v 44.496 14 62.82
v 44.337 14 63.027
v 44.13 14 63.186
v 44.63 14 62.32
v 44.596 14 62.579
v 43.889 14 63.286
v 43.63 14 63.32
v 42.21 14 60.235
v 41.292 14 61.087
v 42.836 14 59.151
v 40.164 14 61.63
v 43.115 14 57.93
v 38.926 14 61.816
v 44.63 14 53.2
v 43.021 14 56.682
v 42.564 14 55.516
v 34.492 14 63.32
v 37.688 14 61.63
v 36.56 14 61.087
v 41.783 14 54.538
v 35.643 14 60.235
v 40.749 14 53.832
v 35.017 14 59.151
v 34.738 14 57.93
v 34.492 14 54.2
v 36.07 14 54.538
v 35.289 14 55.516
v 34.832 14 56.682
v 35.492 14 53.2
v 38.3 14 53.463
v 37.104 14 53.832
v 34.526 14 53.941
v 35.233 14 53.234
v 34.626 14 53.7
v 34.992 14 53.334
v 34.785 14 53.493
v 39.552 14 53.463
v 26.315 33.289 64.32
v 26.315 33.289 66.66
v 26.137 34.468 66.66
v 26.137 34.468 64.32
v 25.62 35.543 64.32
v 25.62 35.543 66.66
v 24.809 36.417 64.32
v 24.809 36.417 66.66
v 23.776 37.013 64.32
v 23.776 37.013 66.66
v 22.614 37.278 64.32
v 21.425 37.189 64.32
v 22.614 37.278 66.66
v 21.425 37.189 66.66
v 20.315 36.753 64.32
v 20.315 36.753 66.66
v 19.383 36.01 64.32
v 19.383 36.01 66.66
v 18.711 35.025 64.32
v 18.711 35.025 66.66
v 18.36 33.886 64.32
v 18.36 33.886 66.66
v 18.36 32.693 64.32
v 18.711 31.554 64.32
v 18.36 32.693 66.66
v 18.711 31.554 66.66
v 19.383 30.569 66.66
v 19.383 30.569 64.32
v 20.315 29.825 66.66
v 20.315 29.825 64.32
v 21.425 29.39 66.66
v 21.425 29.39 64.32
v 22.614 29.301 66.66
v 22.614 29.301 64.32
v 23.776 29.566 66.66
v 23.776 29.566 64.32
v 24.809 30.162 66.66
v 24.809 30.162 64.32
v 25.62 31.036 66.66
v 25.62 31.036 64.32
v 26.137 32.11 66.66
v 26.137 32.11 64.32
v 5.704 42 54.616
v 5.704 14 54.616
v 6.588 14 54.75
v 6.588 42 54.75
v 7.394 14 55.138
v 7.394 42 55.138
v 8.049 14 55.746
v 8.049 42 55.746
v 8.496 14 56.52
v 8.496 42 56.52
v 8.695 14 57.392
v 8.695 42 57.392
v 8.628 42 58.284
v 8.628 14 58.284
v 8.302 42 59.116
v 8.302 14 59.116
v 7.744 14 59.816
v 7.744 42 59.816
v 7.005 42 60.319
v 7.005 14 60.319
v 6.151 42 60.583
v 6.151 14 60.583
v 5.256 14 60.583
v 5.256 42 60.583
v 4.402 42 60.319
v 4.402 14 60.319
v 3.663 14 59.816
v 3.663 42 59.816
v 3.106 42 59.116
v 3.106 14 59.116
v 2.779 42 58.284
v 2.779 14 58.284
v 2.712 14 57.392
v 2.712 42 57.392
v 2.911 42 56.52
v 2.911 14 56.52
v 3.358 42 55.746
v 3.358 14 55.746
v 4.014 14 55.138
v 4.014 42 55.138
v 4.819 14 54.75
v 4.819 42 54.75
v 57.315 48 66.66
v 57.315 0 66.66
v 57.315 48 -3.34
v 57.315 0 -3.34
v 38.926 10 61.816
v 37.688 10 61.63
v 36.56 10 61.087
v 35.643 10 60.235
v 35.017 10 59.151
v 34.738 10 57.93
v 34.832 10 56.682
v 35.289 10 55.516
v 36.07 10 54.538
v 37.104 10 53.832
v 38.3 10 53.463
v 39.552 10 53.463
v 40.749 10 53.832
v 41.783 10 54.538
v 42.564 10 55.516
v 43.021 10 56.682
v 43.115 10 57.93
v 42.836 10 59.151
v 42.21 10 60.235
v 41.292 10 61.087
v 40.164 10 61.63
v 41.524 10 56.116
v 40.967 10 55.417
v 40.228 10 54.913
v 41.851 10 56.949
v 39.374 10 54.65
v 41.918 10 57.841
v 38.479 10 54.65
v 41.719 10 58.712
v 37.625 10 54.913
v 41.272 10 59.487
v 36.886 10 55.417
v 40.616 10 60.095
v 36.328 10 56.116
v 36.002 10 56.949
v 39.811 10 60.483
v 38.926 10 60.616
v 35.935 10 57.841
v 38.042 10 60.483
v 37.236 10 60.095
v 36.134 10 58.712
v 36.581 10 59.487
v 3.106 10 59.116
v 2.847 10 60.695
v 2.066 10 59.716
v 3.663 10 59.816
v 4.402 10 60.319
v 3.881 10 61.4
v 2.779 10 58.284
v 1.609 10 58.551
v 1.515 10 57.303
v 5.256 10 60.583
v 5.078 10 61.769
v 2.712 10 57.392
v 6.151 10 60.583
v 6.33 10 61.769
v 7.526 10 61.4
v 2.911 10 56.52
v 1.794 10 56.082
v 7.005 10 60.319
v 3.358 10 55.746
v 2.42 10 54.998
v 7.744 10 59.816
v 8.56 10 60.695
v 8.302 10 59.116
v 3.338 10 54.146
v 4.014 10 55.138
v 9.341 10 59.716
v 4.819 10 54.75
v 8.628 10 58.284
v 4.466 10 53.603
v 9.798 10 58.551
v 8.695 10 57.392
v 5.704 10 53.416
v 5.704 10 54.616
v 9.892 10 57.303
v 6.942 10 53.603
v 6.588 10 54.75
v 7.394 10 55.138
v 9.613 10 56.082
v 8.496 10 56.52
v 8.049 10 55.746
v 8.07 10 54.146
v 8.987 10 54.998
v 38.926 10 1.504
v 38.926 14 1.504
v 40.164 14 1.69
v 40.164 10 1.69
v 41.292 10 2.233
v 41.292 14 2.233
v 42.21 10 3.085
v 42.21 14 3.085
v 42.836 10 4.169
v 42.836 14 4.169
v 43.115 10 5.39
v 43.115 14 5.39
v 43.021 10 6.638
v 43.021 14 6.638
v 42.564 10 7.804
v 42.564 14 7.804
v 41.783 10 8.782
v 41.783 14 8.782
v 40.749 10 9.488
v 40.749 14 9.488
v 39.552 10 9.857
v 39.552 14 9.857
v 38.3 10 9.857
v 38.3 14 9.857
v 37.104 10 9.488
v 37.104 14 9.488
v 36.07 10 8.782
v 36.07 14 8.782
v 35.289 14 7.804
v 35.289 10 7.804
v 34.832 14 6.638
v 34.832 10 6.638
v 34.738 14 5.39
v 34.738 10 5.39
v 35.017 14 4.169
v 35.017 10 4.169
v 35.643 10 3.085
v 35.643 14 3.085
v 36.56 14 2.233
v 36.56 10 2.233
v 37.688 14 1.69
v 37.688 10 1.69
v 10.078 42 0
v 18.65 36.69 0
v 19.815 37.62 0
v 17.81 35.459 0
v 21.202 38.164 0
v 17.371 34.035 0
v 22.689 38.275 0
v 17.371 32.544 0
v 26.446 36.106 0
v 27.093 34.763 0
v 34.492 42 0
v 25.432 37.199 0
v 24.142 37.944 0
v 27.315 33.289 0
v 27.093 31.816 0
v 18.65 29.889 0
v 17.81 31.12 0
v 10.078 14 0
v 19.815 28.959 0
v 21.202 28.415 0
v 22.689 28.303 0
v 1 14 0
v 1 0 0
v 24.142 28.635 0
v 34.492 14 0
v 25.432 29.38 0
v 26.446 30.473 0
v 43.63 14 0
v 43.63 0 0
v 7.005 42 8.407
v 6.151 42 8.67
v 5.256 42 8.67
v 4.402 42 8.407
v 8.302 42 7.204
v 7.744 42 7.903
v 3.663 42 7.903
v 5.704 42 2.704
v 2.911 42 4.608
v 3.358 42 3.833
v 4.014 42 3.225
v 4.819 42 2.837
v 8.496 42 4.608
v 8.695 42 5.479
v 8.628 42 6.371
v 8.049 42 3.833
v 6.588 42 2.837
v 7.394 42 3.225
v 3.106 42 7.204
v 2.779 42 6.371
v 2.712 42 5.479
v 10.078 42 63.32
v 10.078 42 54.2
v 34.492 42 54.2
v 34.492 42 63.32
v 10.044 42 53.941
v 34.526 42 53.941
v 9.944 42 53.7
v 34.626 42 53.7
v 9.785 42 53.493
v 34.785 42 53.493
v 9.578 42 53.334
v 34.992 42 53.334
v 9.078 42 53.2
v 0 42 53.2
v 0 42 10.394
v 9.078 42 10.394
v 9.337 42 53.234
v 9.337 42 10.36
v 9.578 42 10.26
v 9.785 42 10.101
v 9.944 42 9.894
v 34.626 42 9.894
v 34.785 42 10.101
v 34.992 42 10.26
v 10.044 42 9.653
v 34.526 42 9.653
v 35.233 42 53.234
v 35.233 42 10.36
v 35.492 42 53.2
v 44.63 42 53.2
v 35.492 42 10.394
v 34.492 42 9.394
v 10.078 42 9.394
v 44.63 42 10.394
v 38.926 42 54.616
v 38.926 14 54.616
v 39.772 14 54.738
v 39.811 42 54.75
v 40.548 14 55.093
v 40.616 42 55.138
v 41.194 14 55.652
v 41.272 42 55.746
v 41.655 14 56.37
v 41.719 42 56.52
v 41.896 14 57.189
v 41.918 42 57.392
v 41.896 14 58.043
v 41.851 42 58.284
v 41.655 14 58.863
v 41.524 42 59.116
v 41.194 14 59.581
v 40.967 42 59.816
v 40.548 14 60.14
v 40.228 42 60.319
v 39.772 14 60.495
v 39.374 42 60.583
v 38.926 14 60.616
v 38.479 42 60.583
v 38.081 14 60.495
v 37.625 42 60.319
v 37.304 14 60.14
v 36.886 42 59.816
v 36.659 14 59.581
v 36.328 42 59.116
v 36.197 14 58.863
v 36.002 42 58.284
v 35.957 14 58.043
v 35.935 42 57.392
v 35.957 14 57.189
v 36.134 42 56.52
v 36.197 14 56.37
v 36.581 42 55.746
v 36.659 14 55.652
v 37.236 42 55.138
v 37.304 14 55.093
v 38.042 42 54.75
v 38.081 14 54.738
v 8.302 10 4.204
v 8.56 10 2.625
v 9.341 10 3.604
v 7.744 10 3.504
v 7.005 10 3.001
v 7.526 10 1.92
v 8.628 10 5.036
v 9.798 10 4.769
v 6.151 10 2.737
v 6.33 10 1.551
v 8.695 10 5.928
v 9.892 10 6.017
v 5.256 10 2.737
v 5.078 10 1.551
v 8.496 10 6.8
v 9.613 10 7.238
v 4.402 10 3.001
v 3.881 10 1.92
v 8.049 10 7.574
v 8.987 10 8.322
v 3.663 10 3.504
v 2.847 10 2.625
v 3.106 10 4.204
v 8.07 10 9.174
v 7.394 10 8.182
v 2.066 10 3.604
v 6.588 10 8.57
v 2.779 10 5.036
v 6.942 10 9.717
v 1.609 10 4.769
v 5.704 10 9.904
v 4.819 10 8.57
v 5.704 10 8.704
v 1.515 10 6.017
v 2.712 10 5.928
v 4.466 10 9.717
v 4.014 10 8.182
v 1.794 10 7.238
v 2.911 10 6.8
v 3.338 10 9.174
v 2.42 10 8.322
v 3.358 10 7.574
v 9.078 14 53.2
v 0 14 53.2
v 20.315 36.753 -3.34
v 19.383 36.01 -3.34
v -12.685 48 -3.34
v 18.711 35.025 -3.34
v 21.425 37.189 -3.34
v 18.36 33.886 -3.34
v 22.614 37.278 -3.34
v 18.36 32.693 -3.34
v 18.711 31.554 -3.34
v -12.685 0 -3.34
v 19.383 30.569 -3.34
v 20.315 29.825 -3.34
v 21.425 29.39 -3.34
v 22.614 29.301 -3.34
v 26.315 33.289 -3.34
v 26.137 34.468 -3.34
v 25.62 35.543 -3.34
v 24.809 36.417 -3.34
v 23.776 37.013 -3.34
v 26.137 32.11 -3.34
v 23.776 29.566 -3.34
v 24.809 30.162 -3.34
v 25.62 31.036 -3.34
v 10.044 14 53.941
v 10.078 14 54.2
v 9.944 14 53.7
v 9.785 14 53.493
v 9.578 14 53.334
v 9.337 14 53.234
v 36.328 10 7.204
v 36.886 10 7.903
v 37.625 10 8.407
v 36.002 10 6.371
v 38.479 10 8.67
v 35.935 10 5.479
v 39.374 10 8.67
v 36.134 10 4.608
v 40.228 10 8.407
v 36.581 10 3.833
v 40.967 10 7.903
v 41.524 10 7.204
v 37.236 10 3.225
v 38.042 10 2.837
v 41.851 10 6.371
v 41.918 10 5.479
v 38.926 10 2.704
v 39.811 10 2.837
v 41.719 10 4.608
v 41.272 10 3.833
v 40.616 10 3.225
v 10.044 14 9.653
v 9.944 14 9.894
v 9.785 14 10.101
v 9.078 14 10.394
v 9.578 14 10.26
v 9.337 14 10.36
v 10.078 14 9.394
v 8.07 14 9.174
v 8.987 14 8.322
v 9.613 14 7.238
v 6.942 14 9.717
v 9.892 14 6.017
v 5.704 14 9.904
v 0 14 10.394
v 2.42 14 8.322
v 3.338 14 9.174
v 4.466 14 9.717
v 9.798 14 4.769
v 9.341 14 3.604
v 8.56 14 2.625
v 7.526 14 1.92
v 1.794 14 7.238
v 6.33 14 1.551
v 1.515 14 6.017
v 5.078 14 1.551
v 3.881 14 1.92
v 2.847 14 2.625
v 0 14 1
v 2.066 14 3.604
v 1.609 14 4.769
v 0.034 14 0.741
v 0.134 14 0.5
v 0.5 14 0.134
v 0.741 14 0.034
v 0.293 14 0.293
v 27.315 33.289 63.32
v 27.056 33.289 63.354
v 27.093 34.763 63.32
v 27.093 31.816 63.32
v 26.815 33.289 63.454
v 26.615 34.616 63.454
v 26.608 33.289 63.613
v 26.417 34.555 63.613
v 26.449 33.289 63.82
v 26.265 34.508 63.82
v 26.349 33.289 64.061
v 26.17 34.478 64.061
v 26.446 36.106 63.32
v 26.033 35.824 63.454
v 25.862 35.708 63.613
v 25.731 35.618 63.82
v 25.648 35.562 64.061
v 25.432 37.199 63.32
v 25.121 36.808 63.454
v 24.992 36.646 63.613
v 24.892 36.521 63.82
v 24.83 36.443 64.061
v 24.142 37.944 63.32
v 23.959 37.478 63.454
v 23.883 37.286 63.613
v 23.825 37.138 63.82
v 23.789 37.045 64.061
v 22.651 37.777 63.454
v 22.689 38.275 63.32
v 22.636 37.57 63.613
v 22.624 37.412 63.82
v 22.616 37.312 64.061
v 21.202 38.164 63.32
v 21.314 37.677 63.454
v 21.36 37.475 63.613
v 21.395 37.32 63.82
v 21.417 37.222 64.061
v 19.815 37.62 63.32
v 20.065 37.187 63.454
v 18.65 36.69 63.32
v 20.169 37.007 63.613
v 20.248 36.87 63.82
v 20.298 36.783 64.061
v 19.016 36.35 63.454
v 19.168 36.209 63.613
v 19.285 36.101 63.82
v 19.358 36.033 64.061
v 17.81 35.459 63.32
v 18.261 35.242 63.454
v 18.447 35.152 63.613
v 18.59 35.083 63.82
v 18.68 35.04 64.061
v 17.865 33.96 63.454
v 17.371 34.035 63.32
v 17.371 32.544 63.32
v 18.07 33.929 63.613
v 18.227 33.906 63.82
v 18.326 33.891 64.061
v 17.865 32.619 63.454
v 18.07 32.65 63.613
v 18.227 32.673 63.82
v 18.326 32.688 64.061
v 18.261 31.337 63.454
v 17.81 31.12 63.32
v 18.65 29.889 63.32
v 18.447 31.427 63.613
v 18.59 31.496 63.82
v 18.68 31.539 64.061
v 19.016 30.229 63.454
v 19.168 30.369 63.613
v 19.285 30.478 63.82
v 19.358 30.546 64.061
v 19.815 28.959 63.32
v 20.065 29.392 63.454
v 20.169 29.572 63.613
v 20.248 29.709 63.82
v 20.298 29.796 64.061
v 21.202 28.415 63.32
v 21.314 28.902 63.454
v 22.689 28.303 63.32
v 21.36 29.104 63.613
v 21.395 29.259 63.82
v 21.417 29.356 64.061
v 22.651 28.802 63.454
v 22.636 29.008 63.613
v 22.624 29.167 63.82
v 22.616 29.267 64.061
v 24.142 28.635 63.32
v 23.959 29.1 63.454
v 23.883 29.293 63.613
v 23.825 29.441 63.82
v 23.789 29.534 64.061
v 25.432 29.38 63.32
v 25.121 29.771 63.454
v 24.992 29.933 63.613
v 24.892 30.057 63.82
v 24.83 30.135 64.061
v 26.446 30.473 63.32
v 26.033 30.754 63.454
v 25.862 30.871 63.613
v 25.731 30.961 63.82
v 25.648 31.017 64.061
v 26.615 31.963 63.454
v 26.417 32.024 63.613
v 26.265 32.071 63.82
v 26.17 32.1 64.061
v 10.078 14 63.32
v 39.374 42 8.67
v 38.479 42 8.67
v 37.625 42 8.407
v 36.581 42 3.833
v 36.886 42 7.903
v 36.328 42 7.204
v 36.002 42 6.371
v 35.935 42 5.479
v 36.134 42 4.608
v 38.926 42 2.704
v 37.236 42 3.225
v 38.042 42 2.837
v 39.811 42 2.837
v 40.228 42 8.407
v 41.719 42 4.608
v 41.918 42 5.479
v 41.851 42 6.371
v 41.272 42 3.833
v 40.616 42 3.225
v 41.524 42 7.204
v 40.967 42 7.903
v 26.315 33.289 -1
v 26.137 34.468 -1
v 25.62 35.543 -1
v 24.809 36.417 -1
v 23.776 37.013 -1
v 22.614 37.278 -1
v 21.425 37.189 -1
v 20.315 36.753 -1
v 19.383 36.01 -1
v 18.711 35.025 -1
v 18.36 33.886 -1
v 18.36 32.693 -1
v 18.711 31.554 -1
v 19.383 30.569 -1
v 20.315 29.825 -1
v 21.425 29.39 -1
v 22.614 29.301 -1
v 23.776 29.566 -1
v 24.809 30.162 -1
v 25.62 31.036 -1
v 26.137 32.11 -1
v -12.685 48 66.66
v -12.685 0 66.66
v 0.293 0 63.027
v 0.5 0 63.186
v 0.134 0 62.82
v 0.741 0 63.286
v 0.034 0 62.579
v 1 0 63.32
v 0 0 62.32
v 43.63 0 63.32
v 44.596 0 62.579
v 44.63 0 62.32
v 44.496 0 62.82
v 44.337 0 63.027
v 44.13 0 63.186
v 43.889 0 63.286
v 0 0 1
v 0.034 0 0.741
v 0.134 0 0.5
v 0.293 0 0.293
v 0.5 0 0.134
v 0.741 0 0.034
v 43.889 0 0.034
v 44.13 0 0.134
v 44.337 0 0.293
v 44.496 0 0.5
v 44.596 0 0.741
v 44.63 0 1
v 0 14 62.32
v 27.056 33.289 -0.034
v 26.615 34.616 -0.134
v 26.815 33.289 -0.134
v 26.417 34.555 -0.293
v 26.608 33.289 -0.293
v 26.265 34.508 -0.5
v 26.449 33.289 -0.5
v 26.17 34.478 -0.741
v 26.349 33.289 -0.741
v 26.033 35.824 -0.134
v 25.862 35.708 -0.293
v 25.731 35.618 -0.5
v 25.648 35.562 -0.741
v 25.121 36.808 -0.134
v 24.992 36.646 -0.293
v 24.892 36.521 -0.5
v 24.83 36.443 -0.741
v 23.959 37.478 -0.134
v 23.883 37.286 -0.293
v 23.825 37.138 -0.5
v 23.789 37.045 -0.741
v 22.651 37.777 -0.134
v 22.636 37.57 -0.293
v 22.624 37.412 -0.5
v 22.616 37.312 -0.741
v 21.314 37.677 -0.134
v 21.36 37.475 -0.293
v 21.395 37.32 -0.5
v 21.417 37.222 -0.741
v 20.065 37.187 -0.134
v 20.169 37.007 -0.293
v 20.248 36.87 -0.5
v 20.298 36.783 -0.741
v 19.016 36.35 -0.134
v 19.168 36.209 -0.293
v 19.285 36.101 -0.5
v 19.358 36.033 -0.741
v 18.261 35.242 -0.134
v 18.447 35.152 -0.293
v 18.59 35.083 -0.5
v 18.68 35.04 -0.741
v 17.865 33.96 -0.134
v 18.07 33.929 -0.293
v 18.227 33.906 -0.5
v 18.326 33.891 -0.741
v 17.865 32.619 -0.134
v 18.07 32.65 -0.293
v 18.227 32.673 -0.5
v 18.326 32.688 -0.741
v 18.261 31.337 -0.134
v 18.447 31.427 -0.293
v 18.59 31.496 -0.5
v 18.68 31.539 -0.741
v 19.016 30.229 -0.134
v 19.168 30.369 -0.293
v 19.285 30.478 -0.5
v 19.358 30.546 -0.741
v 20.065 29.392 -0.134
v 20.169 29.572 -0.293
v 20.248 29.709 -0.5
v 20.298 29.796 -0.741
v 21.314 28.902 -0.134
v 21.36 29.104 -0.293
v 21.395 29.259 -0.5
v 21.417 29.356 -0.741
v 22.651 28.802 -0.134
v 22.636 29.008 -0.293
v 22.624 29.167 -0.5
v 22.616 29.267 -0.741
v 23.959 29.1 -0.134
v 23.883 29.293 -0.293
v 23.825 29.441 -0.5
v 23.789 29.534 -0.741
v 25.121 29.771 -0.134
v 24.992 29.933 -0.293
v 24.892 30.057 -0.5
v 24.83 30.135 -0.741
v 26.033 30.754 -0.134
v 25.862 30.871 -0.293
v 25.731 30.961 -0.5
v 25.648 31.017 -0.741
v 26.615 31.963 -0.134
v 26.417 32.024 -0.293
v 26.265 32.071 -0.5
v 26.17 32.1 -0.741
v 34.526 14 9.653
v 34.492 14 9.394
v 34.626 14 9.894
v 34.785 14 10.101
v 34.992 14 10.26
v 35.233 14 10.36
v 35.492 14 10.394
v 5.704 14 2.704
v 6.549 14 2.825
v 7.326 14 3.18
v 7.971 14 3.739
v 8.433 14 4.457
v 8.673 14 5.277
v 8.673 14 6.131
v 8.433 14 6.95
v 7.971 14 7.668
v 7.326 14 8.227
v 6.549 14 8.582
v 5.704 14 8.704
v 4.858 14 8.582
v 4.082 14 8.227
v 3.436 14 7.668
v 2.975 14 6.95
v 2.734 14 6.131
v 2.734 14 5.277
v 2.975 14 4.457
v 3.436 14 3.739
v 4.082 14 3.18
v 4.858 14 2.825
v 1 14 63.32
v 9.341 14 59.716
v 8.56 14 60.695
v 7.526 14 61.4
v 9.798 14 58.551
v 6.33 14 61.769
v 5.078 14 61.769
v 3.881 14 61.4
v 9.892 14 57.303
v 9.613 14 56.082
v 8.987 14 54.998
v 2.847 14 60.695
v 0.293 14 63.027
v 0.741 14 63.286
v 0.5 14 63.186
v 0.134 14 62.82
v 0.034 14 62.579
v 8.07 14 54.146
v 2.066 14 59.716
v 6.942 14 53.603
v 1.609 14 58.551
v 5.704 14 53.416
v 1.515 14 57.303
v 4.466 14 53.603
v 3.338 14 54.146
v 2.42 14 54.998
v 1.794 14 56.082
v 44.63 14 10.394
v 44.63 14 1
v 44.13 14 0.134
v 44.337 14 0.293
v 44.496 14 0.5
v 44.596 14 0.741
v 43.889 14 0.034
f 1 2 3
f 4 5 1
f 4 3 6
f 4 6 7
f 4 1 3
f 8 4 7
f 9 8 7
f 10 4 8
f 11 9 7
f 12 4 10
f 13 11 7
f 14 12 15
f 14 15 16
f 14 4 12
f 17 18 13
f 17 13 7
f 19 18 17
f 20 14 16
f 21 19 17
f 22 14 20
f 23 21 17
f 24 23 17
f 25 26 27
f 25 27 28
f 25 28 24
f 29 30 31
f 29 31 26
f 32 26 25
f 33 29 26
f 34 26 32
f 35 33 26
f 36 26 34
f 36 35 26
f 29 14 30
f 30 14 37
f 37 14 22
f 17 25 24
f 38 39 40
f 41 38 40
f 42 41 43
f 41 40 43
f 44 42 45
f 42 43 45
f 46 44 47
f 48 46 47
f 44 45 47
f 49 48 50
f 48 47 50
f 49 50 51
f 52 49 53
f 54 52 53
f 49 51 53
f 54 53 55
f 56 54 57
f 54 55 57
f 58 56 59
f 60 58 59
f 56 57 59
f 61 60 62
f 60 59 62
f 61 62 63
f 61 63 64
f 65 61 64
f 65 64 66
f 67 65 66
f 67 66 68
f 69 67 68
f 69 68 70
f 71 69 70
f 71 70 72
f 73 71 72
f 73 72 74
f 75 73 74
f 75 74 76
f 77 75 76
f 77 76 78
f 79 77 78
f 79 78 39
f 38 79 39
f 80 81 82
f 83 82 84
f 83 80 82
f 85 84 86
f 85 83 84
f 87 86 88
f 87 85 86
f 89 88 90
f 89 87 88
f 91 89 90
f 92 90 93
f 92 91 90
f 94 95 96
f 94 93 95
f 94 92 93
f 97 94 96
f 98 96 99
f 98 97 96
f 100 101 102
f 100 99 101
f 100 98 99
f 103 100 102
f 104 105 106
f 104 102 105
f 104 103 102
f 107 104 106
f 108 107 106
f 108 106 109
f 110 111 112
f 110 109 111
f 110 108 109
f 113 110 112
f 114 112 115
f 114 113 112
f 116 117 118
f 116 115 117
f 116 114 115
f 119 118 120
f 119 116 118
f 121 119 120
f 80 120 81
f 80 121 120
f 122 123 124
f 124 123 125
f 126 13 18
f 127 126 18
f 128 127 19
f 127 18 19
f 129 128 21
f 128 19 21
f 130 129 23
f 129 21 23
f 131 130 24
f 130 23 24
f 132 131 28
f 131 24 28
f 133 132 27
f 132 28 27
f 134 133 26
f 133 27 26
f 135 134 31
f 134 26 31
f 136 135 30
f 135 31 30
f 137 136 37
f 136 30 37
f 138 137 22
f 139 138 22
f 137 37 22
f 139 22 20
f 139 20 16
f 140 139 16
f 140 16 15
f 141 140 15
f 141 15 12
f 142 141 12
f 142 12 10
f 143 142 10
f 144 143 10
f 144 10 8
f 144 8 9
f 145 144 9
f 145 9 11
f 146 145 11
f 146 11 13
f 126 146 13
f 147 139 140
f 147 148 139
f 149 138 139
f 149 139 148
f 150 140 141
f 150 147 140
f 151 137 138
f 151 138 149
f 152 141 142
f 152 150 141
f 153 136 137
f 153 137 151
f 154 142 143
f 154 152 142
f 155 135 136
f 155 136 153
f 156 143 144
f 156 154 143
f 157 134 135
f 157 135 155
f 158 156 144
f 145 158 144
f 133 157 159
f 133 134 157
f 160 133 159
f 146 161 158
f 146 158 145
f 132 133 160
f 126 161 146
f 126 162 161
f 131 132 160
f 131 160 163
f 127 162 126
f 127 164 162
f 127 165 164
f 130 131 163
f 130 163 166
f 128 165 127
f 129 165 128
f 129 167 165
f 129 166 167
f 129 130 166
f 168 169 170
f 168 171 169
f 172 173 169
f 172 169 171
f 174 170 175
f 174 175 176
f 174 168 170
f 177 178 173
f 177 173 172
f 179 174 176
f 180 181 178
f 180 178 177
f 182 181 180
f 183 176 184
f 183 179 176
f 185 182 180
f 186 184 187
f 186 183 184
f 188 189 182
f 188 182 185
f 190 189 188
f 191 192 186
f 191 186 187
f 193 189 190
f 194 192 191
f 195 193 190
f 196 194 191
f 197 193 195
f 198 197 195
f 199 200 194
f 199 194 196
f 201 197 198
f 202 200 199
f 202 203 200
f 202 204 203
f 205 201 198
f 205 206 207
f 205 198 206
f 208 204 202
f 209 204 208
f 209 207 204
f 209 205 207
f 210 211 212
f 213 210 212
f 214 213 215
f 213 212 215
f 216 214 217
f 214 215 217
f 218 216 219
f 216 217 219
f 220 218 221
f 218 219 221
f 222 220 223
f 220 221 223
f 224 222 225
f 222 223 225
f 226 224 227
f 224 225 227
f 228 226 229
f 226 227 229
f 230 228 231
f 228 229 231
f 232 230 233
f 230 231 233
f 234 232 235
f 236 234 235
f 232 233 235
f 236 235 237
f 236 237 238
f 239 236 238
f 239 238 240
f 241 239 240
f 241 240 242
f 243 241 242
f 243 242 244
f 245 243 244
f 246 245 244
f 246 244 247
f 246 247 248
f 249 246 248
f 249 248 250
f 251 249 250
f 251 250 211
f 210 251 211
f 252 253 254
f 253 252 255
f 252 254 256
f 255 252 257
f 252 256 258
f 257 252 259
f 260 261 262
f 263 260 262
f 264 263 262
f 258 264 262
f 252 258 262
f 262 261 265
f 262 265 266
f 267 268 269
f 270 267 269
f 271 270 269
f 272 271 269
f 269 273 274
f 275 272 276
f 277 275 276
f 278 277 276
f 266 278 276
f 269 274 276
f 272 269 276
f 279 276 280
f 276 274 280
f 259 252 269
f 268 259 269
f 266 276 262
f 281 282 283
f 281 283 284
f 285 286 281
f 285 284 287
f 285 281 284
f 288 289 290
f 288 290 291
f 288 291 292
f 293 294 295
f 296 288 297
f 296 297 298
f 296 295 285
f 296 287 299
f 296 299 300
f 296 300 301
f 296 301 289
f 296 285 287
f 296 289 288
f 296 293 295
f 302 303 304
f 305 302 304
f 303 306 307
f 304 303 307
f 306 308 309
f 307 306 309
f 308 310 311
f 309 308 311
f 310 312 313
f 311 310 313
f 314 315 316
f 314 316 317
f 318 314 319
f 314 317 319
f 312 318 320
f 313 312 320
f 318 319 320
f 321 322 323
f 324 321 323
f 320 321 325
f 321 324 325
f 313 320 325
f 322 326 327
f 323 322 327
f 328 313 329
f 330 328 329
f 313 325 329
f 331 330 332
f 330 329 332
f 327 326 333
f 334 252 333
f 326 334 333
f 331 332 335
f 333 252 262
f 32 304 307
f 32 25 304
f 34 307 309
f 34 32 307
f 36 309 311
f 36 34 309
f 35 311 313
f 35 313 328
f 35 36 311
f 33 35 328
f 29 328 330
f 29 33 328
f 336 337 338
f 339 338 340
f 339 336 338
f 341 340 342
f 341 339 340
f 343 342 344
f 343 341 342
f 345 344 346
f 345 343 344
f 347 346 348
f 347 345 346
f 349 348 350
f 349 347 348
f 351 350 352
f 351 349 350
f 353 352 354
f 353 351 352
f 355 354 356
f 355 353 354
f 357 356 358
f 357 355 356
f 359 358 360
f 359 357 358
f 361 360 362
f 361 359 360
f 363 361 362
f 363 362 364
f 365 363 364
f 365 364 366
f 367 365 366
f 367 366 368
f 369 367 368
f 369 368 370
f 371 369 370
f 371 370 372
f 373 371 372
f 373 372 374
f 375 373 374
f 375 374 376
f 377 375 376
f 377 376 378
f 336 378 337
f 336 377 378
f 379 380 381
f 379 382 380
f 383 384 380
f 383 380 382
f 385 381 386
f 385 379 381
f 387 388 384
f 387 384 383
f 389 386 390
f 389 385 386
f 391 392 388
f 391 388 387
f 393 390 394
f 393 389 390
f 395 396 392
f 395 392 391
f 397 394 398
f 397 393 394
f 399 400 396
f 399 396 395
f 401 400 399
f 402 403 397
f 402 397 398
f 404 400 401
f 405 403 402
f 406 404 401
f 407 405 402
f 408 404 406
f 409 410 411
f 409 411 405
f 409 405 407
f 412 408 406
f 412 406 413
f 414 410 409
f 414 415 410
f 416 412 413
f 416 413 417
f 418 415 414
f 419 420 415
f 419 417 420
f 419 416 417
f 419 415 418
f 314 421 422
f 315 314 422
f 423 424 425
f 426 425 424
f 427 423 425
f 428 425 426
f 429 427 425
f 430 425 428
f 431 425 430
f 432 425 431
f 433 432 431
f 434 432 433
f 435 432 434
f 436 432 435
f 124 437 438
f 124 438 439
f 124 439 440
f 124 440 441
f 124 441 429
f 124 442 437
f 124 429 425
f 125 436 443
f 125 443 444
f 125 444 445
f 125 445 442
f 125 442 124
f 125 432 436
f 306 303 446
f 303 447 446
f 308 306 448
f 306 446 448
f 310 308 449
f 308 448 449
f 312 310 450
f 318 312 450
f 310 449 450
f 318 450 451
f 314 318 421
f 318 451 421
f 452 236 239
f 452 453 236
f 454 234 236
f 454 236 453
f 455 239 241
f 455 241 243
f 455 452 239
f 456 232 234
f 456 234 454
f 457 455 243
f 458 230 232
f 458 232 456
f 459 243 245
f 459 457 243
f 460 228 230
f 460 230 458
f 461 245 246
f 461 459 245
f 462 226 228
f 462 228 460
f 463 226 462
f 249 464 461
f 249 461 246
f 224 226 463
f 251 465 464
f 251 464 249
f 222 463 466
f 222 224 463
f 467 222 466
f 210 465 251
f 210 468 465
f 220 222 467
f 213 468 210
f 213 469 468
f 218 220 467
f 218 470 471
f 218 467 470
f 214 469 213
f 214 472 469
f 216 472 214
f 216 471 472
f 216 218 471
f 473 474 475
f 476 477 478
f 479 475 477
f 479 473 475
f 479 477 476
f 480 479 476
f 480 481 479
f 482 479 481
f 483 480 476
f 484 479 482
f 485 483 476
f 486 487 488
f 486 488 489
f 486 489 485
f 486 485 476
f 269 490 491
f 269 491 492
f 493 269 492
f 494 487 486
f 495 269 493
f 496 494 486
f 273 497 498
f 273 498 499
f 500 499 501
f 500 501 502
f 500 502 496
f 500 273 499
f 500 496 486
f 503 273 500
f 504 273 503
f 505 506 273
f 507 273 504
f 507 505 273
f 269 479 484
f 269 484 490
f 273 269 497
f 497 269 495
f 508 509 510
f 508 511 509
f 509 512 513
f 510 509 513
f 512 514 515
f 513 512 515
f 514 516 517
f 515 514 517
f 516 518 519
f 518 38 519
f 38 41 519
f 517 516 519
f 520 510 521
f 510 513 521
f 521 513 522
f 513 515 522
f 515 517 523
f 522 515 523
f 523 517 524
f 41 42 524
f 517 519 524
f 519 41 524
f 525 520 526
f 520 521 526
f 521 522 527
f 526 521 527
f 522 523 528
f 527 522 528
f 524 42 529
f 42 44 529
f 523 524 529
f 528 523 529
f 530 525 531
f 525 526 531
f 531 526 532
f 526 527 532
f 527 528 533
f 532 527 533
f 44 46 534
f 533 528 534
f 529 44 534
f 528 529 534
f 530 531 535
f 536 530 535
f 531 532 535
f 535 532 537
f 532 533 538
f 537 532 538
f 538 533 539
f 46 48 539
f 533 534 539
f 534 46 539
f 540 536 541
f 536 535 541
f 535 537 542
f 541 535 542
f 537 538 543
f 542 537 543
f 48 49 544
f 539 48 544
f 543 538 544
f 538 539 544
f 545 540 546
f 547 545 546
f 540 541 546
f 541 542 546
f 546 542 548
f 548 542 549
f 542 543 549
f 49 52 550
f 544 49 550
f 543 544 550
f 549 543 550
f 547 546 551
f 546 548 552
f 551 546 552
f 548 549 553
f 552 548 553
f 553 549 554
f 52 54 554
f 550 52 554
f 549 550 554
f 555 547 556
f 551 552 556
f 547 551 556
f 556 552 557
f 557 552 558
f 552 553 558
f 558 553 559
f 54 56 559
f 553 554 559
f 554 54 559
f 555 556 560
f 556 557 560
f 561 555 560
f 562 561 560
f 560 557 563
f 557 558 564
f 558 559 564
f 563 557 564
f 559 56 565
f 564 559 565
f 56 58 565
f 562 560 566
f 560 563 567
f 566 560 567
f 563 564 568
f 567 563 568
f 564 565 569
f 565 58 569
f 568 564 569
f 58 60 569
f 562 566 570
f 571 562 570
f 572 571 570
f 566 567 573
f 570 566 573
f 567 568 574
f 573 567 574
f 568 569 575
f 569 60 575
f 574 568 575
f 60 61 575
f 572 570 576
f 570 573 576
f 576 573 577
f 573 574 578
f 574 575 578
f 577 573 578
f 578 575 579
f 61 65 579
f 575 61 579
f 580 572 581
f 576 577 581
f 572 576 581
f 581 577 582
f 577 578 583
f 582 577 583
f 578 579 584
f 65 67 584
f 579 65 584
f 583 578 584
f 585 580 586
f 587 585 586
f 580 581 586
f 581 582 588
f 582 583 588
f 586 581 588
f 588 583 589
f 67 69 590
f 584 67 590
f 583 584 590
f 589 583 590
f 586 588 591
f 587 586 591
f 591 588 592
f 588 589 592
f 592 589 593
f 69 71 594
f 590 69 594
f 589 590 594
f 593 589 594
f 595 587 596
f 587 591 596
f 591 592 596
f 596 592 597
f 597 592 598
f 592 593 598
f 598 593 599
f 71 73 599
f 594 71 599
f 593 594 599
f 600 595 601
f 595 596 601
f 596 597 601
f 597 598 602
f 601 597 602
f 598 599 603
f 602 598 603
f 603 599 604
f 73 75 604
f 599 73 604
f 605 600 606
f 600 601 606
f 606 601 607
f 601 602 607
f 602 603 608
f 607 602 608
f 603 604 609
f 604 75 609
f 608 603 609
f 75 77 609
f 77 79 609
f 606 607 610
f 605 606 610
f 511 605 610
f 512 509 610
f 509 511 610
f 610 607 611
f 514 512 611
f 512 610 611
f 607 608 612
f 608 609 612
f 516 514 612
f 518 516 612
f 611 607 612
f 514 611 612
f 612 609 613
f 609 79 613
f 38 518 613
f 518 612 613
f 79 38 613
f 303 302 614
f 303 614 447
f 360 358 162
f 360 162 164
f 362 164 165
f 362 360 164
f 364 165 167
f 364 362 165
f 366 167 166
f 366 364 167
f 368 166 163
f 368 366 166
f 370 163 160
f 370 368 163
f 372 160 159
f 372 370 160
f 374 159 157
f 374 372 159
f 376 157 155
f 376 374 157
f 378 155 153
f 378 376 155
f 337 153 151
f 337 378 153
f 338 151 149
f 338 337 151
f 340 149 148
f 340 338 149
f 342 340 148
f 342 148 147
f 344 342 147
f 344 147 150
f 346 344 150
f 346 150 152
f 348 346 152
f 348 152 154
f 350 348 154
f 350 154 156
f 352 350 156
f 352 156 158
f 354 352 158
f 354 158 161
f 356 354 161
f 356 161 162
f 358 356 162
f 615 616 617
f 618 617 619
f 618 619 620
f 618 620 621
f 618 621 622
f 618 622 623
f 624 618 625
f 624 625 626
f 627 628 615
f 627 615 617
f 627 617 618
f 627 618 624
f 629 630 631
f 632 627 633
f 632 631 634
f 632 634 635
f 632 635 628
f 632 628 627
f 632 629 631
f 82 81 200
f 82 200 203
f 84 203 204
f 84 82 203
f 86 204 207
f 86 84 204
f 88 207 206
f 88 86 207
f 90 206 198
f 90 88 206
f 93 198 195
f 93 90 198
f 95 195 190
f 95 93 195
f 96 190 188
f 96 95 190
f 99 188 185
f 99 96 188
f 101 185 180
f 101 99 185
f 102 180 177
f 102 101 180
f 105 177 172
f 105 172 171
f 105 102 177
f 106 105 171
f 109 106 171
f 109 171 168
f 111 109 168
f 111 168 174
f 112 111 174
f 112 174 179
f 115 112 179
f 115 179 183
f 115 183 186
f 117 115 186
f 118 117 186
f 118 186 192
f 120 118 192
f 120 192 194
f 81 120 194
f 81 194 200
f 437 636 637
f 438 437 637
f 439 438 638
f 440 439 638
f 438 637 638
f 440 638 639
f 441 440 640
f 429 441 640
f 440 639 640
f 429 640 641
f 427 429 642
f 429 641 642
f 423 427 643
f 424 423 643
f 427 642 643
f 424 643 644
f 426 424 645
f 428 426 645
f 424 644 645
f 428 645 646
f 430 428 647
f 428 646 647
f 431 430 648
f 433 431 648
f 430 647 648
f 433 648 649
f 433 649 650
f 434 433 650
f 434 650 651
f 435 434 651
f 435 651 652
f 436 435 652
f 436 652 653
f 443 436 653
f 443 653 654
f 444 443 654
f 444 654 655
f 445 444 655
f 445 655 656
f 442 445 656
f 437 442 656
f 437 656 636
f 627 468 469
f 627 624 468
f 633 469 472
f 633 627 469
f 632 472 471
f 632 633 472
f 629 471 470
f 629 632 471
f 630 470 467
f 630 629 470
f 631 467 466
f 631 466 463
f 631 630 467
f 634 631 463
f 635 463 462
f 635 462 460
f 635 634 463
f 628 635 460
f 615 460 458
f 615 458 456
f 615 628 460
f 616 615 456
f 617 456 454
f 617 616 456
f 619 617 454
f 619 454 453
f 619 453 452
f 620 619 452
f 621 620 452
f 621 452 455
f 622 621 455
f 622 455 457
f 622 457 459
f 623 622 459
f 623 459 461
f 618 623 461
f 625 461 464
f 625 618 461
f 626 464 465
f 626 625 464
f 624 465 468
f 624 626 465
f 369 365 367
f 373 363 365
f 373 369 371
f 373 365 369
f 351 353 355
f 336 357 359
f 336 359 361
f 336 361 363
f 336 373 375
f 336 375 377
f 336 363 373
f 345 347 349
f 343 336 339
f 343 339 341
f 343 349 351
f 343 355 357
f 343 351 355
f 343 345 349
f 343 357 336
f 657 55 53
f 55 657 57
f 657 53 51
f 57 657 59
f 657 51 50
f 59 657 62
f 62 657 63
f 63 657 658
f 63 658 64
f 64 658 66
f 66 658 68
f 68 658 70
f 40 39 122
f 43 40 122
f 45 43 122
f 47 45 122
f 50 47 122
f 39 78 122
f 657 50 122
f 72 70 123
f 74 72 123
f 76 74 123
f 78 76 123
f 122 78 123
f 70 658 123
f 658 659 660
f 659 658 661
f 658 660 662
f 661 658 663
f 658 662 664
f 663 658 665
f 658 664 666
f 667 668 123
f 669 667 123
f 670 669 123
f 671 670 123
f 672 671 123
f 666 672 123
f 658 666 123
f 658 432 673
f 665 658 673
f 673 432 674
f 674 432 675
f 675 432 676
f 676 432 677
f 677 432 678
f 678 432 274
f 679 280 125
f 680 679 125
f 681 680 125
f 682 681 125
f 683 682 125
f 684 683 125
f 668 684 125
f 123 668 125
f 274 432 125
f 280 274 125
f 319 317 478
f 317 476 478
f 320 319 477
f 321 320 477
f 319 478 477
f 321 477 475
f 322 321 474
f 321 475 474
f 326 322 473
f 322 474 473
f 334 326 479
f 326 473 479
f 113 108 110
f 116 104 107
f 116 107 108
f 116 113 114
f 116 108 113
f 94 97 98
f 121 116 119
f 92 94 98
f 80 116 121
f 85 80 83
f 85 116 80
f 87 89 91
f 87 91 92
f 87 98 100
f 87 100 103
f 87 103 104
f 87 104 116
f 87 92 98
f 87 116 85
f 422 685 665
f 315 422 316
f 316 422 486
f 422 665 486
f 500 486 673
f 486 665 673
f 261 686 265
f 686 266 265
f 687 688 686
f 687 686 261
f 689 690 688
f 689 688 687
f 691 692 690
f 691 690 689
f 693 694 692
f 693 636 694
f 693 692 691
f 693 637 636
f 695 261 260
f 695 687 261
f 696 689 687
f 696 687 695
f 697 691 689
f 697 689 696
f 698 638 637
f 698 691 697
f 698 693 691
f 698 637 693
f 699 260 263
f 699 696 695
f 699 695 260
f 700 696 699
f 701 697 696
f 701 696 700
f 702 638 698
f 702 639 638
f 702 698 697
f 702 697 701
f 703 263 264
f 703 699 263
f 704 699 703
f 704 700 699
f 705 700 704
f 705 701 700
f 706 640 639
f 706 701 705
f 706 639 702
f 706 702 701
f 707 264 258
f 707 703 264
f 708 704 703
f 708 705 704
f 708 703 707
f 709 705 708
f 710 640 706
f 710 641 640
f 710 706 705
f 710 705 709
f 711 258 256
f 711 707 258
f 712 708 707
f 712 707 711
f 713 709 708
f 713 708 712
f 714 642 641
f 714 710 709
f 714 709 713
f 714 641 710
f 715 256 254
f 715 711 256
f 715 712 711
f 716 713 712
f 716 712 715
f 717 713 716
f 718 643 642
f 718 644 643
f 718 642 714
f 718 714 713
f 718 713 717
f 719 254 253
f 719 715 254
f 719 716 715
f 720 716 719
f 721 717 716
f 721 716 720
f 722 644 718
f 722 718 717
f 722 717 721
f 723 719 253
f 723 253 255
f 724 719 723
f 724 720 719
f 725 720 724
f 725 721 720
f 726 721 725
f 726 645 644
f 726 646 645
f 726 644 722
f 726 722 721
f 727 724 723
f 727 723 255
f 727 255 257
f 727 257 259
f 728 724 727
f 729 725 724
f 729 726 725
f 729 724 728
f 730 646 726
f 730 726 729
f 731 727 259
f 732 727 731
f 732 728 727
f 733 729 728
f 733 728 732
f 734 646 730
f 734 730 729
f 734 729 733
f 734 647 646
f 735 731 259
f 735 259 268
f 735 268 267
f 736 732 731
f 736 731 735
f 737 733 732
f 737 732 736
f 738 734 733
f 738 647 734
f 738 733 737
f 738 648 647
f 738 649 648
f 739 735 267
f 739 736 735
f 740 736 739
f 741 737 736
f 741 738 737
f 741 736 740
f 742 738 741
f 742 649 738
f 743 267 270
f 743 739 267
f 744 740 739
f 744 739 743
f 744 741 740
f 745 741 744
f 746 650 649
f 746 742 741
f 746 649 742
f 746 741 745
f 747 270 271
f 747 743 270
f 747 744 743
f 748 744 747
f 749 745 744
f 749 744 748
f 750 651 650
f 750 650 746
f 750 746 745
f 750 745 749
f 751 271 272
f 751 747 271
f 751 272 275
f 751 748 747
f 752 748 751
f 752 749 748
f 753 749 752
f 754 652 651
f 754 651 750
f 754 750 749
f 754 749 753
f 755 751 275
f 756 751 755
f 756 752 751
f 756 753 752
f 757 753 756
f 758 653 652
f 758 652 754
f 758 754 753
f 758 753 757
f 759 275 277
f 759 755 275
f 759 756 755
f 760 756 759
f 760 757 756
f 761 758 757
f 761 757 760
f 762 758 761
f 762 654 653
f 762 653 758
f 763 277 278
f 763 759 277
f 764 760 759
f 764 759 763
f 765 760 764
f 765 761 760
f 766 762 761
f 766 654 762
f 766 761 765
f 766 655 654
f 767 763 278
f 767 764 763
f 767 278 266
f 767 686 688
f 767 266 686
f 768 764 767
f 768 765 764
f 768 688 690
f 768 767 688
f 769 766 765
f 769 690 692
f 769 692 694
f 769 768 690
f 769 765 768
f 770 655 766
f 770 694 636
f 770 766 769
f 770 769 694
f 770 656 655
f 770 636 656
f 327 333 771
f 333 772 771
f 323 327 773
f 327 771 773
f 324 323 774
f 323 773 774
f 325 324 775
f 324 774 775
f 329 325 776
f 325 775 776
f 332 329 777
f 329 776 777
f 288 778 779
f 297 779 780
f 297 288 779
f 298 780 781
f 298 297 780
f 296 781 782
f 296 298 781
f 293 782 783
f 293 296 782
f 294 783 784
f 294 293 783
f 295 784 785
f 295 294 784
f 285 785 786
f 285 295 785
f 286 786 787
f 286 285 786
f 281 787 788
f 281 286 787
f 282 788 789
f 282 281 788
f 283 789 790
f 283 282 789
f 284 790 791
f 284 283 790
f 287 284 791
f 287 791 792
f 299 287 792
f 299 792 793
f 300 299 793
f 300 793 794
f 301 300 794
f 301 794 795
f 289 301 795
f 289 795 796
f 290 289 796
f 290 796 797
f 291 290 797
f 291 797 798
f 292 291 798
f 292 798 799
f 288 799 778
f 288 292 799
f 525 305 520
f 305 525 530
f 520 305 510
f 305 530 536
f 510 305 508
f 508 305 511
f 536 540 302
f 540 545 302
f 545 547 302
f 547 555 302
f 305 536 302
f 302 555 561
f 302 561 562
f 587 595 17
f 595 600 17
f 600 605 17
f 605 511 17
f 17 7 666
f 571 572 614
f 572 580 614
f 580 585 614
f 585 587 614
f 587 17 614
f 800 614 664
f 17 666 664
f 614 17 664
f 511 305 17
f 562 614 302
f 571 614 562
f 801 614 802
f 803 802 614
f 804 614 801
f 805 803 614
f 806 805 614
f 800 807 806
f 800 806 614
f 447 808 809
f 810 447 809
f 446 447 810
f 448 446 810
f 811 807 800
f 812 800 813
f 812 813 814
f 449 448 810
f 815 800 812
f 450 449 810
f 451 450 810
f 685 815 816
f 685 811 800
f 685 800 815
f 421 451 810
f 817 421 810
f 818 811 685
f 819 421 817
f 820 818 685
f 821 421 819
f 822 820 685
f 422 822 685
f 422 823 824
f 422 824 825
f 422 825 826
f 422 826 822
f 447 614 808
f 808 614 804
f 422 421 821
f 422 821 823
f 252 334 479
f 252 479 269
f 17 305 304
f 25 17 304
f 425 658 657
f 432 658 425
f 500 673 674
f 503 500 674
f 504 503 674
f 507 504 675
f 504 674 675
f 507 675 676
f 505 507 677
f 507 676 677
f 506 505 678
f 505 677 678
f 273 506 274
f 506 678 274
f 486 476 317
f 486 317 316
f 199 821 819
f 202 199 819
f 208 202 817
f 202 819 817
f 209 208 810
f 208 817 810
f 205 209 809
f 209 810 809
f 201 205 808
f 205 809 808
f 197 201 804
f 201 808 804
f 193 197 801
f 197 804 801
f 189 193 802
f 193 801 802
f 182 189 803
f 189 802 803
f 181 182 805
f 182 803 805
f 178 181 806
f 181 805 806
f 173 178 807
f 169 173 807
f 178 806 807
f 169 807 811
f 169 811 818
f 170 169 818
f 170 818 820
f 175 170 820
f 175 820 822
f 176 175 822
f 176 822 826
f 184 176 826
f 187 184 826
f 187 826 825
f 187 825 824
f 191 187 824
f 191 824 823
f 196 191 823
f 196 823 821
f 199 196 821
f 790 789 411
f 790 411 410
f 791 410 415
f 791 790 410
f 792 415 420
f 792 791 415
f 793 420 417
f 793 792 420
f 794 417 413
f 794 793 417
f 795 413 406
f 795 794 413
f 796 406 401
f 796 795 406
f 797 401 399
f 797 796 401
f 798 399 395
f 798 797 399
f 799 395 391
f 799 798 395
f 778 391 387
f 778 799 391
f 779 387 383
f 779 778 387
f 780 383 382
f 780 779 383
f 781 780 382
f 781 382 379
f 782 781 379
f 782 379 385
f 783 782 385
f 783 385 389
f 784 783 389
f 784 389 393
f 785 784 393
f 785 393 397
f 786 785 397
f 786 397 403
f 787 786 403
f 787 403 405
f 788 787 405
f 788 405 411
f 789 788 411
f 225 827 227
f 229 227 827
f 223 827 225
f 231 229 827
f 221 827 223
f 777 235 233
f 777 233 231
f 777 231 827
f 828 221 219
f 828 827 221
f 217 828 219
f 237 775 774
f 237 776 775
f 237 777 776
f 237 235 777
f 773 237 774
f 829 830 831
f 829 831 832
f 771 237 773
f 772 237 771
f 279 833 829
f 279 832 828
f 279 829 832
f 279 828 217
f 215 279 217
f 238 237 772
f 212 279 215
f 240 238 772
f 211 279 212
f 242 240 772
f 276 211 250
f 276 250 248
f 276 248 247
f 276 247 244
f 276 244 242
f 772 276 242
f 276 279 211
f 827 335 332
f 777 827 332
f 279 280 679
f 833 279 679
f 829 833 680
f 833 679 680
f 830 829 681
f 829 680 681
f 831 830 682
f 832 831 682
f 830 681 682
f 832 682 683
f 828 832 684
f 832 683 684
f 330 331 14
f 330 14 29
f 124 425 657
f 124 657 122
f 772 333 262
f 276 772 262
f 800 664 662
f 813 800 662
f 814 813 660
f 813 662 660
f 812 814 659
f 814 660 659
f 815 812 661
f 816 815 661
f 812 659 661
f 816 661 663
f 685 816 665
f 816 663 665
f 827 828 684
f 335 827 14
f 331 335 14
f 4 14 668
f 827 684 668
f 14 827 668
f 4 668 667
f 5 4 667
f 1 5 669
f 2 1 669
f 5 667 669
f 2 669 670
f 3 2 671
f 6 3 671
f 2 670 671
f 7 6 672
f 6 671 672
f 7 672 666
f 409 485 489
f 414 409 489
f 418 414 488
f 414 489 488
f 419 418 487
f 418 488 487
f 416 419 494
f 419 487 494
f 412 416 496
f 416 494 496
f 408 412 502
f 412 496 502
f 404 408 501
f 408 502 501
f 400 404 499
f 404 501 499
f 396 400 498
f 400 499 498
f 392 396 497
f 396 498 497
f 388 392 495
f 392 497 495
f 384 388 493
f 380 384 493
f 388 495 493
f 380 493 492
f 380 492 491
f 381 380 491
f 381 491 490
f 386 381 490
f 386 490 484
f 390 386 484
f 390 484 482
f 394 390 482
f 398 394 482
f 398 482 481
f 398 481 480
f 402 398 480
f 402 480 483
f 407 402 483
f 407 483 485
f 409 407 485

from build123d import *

# Parameters (mm, degrees)
SKETCH1_W           = 70
SKETCH1_H           = 70
BOSS_EXTRUDE1_DEPTH = 42
SKETCH2_W           = 70
SKETCH2_H           = 70
BOSS_EXTRUDE2_DEPTH = 6
SKETCH3_R           = 4
CUT_EXTRUDE1_DEPTH  = 74
SKETCH6_W           = 10.07808718
SKETCH6_H           = 10.120371506
SKETCH6_W_2         = 10.137770901
SKETCH6_H_2         = 10.393985643
BOSS_EXTRUDE4_DEPTH = 28
FILLET1_R           = 1
SKETCH4_R           = 4.2
SKETCH4_R_2         = 3
BOSS_EXTRUDE3_DEPTH = 32
CUT_EXTRUDE2_START  = -28
SKETCH8_R           = 3
CUT_EXTRUDE2_DEPTH  = 28
FILLET2_R           = 1


with BuildPart() as part:
    # Sketch1 → Boss-Extrude1 (new body)
    with BuildSketch(Plane(origin=(0, 0, 0), x_dir=(1, 0, 0), z_dir=(0, 1, 0))):
        with Locations((22.315, -31.66)):
            Rectangle(SKETCH1_W, SKETCH1_H)
        with BuildLine():
            Line((1, 0), (43.63, 0))
            ThreePointArc((43.63, 0), (44.337106781, -0.292893219), (44.63, -1))
            Line((44.63, -1), (44.63, -62.32))
            ThreePointArc((44.63, -62.32), (44.337106781, -63.027106781), (43.63, -63.32))
            Line((43.63, -63.32), (1, -63.32))
            ThreePointArc((1, -63.32), (0.292893219, -63.027106781), (0, -62.32))
            Line((0, -62.32), (0, -1))
            ThreePointArc((0, -1), (0.292893219, -0.292893219), (1, 0))
        make_face(mode=Mode.SUBTRACT)
    extrude(amount=BOSS_EXTRUDE1_DEPTH)

    # Sketch2 → Boss-Extrude2 (add)
    with BuildSketch(Plane(origin=(0, 42, 0), x_dir=(1, 0, 0), z_dir=(0, 1, 0))):
        with Locations((22.315, -31.66)):
            Rectangle(SKETCH2_W, SKETCH2_H)
    extrude(amount=BOSS_EXTRUDE2_DEPTH)

    # Sketch3 → Cut-Extrude1 (cut)
    with BuildSketch(Plane.XY.offset(66.66)):
        with Locations((22.315, 33.289388907)):
            Circle(SKETCH3_R)
    extrude(amount=-CUT_EXTRUDE1_DEPTH, mode=Mode.SUBTRACT)

    # Sketch6 → Boss-Extrude4 (add)
    with BuildSketch(Plane(origin=(0, 42, 0), x_dir=(-1, 0, 0), z_dir=(0, -1, 0))):
        with Locations((-5.03904359, -58.259814247)):
            Rectangle(SKETCH6_W, SKETCH6_H)
        with Locations((-39.56111455, -58.259814247)):
            Rectangle(SKETCH6_W_2, SKETCH6_H)
        with Locations((-39.56111455, -5.196992822)):
            Rectangle(SKETCH6_W_2, SKETCH6_H_2)
        with Locations((-5.03904359, -5.196992822)):
            Rectangle(SKETCH6_W, SKETCH6_H_2)
    extrude(amount=BOSS_EXTRUDE4_DEPTH)

    # Fillet1
    fillet1_edges = [part.edges().sort_by_distance(p)[0] for p in [
        (34.492229099, 28, 10.393985643),
        (10.07808718, 28, 10.393985643),
        (10.07808718, 28, 53.199628494),
        (34.492229099, 28, 53.199628494),
    ]]
    fillet(fillet1_edges, radius=FILLET1_R)

    # Sketch4 → Boss-Extrude3 (add)
    # profile 1 of 4: a face of its own
    with BuildSketch(Plane.XZ.offset(-42)):
        with Locations(Location((5.703606864, 5.703606864, 0), (0, 0, 90))):
            Circle(SKETCH4_R)
        with Locations(Location((5.703606864, 5.703606864, 0), (0, 0, 90))):
            Circle(SKETCH4_R_2, mode=Mode.SUBTRACT)
    # profile 2 of 4: a face of its own
    with BuildSketch(Plane.XZ.offset(-42)):
        with Locations(Location((38.926393136, 5.703606864, 0), (0, 0, 270))):
            Circle(SKETCH4_R)
        with Locations(Location((38.926393136, 5.703606864, 0), (0, 0, 270))):
            Circle(SKETCH4_R_2, mode=Mode.SUBTRACT)
    # profile 3 of 4: a face of its own
    with BuildSketch(Plane.XZ.offset(-42)):
        with Locations(Location((38.926393136, 57.616393136, 0), (0, 0, 90))):
            Circle(SKETCH4_R)
        with Locations(Location((38.926393136, 57.616393136, 0), (0, 0, 90))):
            Circle(SKETCH4_R_2, mode=Mode.SUBTRACT)
    # profile 4 of 4: a face of its own
    with BuildSketch(Plane.XZ.offset(-42)):
        with Locations(Location((5.703606864, 57.616393136, 0), (0, 0, 270))):
            Circle(SKETCH4_R)
        with Locations(Location((5.703606864, 57.616393136, 0), (0, 0, 270))):
            Circle(SKETCH4_R_2, mode=Mode.SUBTRACT)
    extrude(amount=BOSS_EXTRUDE3_DEPTH)

    # Sketch8 → Cut-Extrude2 (cut)
    with BuildSketch(Plane(origin=(0, 14, 0), x_dir=(-1, 0, 0), z_dir=(0, -1, 0)).offset(CUT_EXTRUDE2_START)):
        with Locations(Location((-5.703606864, -57.616393136, 0), (0, 0, 90))):
            Circle(SKETCH8_R)
        with Locations(Location((-38.926393136, -57.616393136, 0), (0, 0, 90))):
            Circle(SKETCH8_R)
        with Locations(Location((-38.926393136, -5.703606864, 0), (0, 0, 90))):
            Circle(SKETCH8_R)
        with Locations(Location((-5.703606864, -5.703606864, 0), (0, 0, 90))):
            Circle(SKETCH8_R)
    extrude(amount=CUT_EXTRUDE2_DEPTH, mode=Mode.SUBTRACT)

    # Fillet2
    fillet2_edges = [part.edges().sort_by_distance(p)[0] for p in [
        (18.315, 33.289388907, 0),
        (18.315, 33.289388907, 63.32),
    ]]
    fillet(fillet2_edges, radius=FILLET2_R)


solid = part.part
